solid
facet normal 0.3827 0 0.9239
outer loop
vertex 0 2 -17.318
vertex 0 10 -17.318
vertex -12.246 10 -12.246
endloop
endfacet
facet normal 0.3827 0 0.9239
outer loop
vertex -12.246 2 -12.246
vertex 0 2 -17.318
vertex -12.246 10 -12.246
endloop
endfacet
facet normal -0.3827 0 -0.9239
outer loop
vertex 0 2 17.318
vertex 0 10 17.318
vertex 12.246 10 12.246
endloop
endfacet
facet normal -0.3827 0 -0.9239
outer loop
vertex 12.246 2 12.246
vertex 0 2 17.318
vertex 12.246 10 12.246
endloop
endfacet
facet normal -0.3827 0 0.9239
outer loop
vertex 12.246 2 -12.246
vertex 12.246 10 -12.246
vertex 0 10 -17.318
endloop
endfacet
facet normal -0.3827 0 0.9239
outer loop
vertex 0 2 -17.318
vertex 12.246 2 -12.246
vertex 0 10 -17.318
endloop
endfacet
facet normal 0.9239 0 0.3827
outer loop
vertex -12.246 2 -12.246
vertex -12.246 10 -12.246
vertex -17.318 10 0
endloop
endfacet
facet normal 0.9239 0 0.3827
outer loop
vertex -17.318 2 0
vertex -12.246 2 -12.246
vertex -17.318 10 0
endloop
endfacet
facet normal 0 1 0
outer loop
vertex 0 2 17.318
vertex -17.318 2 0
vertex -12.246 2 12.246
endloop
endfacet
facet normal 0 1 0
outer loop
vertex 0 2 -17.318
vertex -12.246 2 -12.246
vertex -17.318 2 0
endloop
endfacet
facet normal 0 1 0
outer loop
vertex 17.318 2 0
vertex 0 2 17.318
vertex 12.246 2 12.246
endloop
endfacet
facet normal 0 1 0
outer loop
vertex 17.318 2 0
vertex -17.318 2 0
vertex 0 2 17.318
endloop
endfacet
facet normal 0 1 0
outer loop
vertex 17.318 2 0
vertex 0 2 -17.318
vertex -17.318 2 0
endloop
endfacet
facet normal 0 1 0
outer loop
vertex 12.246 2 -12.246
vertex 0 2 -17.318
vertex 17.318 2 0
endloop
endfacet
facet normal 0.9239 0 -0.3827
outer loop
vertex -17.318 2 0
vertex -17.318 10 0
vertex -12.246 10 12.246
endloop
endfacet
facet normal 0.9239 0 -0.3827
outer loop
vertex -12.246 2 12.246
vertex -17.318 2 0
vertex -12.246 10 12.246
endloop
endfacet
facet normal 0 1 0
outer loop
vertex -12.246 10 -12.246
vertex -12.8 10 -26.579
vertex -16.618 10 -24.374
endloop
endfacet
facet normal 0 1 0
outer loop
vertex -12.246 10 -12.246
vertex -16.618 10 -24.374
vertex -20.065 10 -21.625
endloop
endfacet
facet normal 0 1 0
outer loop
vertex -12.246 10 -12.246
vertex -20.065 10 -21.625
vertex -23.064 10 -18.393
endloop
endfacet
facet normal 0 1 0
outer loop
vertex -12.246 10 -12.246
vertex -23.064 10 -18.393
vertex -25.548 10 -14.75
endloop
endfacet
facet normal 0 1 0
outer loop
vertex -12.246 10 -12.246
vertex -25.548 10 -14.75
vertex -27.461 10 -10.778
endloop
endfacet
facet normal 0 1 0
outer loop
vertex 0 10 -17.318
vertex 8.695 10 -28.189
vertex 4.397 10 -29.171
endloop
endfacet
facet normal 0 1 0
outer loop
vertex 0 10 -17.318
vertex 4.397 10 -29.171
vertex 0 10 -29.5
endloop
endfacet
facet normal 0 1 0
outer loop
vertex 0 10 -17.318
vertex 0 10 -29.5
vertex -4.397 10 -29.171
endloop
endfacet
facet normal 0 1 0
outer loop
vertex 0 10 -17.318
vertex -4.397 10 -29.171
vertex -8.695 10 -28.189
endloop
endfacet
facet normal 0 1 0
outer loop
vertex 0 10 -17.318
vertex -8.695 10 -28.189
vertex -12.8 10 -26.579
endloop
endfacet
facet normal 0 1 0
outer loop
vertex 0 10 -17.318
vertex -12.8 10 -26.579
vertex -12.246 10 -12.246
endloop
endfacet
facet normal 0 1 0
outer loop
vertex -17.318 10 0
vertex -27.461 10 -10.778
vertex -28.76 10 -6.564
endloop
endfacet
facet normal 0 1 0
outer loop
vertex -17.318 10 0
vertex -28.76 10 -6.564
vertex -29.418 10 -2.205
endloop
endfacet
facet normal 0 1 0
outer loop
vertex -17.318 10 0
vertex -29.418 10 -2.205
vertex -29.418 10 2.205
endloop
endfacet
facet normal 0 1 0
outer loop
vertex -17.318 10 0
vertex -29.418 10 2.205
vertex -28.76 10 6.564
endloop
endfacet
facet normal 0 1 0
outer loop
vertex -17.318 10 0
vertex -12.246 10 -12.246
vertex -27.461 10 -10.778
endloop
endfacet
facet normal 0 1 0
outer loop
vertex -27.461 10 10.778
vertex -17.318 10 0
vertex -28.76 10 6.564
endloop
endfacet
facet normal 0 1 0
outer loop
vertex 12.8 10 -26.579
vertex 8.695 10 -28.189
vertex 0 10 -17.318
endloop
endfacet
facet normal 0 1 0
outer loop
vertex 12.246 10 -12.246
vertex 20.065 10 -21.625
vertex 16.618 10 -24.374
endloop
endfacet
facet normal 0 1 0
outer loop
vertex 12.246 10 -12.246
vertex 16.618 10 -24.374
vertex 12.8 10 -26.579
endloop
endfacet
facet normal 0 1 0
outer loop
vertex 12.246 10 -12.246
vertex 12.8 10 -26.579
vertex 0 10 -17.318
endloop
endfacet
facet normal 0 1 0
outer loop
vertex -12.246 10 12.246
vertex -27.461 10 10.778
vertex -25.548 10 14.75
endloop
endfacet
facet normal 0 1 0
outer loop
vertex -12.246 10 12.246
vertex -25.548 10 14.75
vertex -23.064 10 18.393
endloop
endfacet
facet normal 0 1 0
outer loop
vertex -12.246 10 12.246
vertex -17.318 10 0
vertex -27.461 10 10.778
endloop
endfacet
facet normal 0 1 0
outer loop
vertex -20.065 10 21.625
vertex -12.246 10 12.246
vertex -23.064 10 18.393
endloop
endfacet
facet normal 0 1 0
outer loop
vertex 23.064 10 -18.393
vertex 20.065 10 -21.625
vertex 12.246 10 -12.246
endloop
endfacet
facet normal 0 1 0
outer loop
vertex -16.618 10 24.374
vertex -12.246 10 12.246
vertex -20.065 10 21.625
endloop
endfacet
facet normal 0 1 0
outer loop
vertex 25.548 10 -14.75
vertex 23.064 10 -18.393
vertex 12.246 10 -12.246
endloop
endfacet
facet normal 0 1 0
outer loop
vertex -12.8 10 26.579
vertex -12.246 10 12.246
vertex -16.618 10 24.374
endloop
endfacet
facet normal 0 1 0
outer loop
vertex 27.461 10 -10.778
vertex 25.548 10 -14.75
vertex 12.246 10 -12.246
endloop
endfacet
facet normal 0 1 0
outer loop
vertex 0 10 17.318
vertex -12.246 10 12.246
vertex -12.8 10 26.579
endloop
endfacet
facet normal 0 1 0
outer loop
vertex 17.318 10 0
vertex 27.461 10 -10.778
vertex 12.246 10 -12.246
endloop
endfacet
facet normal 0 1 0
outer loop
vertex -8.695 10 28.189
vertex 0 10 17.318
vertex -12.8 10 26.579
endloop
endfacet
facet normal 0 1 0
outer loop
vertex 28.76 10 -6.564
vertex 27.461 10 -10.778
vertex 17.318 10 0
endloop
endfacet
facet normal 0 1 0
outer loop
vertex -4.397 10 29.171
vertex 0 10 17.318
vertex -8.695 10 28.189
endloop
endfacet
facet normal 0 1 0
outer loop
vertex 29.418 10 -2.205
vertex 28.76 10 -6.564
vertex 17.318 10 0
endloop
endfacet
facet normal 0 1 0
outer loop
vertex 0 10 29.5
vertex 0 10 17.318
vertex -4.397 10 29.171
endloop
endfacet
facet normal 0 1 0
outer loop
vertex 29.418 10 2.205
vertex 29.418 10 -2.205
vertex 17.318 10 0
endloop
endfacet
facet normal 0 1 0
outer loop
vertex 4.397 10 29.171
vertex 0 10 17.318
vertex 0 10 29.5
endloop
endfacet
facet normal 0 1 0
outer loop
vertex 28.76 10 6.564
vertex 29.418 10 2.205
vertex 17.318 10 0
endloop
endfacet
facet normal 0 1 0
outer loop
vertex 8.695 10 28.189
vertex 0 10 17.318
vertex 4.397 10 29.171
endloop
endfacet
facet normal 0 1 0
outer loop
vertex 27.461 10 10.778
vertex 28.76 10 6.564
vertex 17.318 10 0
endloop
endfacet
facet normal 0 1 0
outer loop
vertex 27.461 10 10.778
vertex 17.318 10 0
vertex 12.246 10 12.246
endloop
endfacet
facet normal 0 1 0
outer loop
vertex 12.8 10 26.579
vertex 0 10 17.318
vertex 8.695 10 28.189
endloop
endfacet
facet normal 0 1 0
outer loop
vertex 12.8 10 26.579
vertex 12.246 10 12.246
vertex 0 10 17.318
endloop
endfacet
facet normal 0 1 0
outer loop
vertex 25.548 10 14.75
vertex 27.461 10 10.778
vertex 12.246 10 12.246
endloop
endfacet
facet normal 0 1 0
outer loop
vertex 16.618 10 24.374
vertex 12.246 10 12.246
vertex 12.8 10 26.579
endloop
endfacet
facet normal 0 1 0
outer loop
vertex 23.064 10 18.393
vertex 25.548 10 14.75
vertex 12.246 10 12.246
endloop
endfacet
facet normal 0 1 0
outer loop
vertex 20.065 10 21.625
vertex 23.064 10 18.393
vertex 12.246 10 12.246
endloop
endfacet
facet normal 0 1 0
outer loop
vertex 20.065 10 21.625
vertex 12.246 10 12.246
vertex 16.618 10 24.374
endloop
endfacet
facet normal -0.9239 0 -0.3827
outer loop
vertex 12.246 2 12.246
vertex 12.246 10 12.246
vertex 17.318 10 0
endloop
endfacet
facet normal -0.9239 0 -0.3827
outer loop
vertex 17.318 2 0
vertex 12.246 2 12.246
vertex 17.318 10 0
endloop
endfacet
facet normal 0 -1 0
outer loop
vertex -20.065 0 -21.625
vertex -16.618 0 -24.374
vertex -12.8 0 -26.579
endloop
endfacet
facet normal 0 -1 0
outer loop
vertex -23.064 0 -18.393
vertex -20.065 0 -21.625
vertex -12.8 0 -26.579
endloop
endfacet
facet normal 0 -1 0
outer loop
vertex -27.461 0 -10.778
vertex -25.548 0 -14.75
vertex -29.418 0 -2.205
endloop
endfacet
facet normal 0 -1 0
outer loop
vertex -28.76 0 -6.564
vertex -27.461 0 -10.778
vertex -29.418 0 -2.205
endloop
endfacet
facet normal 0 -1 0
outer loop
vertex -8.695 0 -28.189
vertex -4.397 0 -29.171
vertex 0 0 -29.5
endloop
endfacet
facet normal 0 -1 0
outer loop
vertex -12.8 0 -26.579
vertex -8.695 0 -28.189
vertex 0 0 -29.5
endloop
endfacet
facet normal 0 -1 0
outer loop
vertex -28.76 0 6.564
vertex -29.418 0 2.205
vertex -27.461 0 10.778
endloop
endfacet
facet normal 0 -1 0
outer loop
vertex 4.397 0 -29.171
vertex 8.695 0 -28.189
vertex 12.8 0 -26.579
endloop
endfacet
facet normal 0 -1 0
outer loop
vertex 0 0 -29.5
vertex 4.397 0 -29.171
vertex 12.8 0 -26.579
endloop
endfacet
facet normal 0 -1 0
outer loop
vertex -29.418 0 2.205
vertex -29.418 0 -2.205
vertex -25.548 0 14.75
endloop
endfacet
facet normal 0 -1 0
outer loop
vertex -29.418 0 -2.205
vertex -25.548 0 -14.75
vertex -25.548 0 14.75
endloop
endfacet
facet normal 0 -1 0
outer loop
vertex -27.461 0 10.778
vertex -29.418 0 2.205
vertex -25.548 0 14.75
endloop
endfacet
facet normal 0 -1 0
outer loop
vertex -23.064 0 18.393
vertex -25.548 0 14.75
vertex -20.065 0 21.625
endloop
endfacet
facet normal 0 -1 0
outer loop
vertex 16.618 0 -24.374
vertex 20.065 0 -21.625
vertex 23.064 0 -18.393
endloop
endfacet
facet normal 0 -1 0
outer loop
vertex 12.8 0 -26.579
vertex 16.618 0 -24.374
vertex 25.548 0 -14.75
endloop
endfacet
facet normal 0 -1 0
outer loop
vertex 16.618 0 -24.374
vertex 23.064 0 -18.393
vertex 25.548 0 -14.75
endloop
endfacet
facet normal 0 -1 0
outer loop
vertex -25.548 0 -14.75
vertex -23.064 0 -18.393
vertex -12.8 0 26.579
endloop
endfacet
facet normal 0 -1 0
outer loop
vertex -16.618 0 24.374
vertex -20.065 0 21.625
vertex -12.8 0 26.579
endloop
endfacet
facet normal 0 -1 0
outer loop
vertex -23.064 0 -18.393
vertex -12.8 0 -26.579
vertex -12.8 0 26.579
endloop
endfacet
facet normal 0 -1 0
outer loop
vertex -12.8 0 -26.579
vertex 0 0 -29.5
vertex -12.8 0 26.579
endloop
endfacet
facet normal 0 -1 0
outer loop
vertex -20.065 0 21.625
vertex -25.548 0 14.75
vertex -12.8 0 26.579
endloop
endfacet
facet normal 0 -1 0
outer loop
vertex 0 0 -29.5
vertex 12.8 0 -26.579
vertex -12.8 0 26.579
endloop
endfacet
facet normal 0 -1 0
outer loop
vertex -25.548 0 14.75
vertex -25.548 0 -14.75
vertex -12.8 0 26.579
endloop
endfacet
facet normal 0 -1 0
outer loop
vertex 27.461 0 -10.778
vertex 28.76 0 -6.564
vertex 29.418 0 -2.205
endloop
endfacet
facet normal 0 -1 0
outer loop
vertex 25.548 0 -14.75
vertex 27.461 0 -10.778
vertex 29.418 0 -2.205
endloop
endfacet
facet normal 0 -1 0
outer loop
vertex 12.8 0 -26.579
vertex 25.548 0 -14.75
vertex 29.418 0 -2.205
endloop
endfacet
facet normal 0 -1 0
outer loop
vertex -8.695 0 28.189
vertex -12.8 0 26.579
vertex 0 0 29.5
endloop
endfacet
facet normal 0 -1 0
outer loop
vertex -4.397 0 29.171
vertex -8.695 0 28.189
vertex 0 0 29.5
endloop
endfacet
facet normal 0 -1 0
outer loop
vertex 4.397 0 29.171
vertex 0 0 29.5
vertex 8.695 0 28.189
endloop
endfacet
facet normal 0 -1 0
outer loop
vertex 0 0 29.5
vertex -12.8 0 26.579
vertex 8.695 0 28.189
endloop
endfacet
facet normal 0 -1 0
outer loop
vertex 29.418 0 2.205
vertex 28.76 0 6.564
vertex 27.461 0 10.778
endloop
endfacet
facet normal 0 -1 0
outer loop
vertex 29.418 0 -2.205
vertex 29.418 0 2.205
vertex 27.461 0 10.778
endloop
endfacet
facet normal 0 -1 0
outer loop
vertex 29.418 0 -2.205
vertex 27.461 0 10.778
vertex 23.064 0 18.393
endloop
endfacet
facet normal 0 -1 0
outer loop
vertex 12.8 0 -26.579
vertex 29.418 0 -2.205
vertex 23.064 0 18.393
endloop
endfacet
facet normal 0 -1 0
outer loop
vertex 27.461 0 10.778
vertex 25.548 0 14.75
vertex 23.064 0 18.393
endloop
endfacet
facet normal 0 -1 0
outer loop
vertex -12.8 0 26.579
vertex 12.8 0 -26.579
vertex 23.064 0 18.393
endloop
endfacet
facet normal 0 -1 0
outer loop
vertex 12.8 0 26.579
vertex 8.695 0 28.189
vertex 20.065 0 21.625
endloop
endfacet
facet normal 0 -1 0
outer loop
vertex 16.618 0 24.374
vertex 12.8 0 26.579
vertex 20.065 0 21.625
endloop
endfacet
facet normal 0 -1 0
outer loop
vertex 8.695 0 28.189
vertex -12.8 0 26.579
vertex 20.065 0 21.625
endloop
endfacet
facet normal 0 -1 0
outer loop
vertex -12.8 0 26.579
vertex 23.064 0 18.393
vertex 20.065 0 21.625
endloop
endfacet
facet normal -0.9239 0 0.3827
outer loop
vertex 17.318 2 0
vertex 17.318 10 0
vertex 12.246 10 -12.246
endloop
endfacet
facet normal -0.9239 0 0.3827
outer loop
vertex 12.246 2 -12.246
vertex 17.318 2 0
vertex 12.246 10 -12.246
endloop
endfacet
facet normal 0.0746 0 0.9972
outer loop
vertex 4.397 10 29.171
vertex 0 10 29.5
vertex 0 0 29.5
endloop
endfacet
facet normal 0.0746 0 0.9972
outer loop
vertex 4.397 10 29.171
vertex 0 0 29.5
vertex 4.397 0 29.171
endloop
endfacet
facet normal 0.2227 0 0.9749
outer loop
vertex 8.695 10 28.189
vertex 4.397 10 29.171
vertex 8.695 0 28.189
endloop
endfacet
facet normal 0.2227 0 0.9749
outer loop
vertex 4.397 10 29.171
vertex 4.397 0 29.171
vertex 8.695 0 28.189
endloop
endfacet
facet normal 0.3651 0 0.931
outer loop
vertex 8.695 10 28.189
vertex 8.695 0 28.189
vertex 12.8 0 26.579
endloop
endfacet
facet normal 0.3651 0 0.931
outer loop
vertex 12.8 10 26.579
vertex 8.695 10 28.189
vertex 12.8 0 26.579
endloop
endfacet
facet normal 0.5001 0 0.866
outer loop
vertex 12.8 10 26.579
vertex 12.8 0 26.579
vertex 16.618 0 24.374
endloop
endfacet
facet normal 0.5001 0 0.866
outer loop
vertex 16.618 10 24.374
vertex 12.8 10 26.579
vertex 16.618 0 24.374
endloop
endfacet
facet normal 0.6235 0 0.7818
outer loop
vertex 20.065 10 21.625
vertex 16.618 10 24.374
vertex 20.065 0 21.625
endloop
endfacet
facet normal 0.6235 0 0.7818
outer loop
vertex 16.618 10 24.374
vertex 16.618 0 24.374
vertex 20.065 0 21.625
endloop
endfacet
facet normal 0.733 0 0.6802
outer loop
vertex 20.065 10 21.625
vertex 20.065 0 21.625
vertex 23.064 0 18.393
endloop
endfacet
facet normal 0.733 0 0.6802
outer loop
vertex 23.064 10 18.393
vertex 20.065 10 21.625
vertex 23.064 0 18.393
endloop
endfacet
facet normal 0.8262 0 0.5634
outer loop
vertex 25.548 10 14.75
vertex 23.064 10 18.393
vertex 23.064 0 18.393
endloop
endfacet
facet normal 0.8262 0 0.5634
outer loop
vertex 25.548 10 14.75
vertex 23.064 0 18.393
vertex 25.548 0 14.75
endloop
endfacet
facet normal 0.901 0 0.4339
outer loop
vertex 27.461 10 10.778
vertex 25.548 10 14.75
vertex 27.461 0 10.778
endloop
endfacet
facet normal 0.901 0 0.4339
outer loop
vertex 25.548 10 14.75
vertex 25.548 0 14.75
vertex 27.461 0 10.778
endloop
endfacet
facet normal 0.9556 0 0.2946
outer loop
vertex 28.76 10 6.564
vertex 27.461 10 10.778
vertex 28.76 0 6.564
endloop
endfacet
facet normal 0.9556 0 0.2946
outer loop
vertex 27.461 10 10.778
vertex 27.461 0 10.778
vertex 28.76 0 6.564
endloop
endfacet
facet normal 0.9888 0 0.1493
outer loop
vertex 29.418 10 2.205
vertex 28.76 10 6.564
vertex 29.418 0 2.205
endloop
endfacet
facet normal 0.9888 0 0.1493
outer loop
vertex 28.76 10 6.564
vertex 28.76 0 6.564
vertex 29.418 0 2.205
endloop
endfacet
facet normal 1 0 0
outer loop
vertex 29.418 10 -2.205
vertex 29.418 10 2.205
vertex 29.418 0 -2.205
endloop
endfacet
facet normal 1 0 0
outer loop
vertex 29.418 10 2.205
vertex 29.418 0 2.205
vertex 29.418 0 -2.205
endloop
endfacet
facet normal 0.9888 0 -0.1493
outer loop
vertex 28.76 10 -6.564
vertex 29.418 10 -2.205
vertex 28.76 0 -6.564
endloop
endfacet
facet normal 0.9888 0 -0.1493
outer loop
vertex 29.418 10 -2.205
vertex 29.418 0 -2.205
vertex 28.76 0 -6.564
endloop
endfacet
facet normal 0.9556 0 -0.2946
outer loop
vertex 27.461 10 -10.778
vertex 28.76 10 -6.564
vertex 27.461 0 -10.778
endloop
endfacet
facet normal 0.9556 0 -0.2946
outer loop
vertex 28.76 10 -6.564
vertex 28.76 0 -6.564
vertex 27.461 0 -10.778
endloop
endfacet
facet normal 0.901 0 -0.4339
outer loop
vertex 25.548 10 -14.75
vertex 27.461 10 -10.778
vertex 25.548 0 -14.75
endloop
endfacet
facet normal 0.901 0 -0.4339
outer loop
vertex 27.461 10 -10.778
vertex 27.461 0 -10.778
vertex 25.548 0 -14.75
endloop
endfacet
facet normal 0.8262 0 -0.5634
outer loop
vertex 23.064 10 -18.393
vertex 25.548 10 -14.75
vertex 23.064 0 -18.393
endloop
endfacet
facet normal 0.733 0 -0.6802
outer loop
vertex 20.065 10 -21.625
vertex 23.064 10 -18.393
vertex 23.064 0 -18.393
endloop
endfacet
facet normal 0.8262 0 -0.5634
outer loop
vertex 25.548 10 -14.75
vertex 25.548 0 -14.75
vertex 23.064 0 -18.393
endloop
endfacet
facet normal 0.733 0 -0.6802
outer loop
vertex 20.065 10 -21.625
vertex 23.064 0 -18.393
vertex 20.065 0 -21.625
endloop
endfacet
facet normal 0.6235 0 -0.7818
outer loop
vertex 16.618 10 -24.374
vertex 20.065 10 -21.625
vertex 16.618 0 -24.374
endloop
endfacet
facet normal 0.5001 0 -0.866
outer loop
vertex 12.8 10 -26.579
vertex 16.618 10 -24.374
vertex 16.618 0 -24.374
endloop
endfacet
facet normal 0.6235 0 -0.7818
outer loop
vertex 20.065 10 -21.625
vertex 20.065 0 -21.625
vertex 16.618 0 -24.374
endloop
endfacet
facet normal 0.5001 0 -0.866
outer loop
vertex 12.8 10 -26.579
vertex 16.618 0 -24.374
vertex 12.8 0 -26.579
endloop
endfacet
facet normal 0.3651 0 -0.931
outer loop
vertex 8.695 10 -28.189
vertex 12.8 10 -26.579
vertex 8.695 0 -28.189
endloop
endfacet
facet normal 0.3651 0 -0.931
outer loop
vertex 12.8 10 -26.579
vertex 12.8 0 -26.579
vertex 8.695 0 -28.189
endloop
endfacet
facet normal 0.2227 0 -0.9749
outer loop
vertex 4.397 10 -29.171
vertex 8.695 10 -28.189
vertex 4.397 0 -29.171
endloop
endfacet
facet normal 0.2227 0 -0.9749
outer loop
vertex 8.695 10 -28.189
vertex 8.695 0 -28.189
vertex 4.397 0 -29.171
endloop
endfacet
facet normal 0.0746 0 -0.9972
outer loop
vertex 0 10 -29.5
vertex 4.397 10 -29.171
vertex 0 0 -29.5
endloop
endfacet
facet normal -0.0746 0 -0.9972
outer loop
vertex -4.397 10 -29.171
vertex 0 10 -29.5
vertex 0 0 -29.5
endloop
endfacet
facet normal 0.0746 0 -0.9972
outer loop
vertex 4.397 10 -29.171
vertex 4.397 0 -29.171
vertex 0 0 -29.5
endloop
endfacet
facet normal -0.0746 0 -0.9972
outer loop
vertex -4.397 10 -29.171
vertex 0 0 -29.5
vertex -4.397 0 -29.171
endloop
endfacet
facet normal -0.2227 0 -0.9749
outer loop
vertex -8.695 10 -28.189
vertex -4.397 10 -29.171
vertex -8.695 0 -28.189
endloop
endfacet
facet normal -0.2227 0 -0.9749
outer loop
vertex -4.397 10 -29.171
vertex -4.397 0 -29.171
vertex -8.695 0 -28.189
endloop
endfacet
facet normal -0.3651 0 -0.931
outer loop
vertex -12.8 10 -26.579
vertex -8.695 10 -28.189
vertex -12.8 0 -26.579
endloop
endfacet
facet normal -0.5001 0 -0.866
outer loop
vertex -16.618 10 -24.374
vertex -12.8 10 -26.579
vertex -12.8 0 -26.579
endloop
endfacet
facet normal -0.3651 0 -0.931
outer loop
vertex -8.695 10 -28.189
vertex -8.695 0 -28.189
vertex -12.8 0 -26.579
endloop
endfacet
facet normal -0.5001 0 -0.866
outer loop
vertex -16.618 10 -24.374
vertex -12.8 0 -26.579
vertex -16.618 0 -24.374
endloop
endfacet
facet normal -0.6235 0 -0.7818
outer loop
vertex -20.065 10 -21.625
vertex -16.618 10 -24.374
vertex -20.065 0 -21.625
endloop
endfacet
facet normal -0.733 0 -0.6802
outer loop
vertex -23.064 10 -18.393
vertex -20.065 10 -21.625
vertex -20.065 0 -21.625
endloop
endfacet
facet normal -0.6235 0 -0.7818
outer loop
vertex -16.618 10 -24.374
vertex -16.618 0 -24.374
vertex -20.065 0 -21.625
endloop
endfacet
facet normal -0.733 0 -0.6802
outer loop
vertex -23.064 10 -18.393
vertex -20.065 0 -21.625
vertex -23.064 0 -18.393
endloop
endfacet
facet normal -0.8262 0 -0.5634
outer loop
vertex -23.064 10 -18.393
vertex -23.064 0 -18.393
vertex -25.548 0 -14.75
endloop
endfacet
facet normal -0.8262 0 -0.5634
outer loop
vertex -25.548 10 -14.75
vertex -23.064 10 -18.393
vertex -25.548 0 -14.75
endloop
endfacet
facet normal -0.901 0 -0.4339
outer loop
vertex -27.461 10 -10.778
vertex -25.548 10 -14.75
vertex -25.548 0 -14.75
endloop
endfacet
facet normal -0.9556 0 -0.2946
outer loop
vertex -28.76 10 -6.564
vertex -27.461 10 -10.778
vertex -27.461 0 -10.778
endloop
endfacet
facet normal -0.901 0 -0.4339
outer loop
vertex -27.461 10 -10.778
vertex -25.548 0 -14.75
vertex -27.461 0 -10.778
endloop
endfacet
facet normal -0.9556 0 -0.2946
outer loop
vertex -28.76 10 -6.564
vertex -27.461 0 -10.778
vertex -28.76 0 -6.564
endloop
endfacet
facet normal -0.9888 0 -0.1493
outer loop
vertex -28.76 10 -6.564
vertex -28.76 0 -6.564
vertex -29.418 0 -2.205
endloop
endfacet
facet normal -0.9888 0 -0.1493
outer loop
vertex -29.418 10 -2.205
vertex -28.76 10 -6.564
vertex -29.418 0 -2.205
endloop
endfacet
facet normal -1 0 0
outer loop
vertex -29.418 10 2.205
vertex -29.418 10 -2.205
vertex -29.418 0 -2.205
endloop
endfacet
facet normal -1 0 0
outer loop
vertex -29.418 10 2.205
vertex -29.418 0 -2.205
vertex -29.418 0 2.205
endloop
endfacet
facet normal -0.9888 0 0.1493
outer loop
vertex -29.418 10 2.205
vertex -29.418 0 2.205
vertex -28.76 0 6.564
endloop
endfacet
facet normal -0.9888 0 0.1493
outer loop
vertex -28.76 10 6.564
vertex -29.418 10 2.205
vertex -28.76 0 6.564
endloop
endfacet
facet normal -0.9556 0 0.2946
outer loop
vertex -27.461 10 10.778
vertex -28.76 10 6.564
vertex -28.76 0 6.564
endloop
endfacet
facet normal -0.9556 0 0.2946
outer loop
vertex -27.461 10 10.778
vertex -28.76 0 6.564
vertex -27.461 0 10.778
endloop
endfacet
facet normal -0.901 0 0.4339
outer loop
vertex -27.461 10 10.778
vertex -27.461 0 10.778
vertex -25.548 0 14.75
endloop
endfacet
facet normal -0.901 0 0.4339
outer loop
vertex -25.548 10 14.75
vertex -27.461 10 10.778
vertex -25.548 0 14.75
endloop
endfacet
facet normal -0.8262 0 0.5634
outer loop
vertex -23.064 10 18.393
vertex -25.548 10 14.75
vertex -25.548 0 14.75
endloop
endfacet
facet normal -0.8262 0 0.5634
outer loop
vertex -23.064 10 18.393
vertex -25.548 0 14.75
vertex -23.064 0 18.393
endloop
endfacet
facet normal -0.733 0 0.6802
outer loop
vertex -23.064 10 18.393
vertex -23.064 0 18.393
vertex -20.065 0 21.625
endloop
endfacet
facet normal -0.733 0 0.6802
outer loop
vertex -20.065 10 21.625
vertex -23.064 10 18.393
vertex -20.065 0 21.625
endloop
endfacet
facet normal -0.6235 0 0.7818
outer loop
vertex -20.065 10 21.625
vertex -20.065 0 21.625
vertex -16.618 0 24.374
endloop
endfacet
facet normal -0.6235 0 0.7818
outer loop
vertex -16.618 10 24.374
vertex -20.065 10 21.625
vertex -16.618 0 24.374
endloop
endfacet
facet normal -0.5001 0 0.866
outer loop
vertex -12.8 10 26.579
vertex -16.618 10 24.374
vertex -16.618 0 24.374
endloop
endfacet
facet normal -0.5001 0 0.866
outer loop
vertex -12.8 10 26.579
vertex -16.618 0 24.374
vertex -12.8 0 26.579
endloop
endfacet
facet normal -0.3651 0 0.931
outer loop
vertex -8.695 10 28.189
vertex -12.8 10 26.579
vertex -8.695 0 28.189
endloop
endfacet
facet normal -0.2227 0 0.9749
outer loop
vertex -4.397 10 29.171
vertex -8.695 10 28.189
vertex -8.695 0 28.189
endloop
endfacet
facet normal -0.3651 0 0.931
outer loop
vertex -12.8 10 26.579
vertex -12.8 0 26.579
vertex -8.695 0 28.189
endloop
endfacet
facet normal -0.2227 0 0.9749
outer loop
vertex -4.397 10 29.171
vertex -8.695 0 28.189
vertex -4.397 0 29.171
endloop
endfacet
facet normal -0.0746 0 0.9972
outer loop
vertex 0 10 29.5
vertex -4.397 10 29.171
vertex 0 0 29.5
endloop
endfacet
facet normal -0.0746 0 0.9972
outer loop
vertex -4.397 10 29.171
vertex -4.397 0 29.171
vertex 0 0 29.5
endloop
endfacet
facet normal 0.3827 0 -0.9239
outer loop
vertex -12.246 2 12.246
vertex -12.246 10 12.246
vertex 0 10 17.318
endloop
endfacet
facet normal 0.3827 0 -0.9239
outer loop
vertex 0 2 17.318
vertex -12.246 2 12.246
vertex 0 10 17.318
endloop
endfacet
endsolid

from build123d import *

# Parameters (mm, degrees)
SKETCH1_R           = 29.5
BOSS_EXTRUDE1_DEPTH = 10
CUT_EXTRUDE1_DEPTH  = 8


with BuildPart() as part:
    # Sketch1 → Boss-Extrude1 (new body)
    with BuildSketch(Plane(origin=(0, 0, 0), x_dir=(1, 0, 0), z_dir=(0, 1, 0))):
        with Locations(Location((0, 0, 0), (0, 0, 270))):
            Circle(SKETCH1_R)
    extrude(amount=BOSS_EXTRUDE1_DEPTH)

    # Sketch2 → Cut-Extrude1 (cut)
    with BuildSketch(Plane(origin=(0, 10, 0), x_dir=(1, 0, 0), z_dir=(0, 1, 0))):
        Polygon((12.245869836, 12.245869836), (0, 17.318275205), (-12.245869836, 12.245869836), (-17.318275205, 0), (-12.245869836, -12.245869836), (0, -17.318275205), (12.245869836, -12.245869836), (17.318275205, 0), align=None)
    extrude(amount=-CUT_EXTRUDE1_DEPTH, mode=Mode.SUBTRACT)


solid = part.part
